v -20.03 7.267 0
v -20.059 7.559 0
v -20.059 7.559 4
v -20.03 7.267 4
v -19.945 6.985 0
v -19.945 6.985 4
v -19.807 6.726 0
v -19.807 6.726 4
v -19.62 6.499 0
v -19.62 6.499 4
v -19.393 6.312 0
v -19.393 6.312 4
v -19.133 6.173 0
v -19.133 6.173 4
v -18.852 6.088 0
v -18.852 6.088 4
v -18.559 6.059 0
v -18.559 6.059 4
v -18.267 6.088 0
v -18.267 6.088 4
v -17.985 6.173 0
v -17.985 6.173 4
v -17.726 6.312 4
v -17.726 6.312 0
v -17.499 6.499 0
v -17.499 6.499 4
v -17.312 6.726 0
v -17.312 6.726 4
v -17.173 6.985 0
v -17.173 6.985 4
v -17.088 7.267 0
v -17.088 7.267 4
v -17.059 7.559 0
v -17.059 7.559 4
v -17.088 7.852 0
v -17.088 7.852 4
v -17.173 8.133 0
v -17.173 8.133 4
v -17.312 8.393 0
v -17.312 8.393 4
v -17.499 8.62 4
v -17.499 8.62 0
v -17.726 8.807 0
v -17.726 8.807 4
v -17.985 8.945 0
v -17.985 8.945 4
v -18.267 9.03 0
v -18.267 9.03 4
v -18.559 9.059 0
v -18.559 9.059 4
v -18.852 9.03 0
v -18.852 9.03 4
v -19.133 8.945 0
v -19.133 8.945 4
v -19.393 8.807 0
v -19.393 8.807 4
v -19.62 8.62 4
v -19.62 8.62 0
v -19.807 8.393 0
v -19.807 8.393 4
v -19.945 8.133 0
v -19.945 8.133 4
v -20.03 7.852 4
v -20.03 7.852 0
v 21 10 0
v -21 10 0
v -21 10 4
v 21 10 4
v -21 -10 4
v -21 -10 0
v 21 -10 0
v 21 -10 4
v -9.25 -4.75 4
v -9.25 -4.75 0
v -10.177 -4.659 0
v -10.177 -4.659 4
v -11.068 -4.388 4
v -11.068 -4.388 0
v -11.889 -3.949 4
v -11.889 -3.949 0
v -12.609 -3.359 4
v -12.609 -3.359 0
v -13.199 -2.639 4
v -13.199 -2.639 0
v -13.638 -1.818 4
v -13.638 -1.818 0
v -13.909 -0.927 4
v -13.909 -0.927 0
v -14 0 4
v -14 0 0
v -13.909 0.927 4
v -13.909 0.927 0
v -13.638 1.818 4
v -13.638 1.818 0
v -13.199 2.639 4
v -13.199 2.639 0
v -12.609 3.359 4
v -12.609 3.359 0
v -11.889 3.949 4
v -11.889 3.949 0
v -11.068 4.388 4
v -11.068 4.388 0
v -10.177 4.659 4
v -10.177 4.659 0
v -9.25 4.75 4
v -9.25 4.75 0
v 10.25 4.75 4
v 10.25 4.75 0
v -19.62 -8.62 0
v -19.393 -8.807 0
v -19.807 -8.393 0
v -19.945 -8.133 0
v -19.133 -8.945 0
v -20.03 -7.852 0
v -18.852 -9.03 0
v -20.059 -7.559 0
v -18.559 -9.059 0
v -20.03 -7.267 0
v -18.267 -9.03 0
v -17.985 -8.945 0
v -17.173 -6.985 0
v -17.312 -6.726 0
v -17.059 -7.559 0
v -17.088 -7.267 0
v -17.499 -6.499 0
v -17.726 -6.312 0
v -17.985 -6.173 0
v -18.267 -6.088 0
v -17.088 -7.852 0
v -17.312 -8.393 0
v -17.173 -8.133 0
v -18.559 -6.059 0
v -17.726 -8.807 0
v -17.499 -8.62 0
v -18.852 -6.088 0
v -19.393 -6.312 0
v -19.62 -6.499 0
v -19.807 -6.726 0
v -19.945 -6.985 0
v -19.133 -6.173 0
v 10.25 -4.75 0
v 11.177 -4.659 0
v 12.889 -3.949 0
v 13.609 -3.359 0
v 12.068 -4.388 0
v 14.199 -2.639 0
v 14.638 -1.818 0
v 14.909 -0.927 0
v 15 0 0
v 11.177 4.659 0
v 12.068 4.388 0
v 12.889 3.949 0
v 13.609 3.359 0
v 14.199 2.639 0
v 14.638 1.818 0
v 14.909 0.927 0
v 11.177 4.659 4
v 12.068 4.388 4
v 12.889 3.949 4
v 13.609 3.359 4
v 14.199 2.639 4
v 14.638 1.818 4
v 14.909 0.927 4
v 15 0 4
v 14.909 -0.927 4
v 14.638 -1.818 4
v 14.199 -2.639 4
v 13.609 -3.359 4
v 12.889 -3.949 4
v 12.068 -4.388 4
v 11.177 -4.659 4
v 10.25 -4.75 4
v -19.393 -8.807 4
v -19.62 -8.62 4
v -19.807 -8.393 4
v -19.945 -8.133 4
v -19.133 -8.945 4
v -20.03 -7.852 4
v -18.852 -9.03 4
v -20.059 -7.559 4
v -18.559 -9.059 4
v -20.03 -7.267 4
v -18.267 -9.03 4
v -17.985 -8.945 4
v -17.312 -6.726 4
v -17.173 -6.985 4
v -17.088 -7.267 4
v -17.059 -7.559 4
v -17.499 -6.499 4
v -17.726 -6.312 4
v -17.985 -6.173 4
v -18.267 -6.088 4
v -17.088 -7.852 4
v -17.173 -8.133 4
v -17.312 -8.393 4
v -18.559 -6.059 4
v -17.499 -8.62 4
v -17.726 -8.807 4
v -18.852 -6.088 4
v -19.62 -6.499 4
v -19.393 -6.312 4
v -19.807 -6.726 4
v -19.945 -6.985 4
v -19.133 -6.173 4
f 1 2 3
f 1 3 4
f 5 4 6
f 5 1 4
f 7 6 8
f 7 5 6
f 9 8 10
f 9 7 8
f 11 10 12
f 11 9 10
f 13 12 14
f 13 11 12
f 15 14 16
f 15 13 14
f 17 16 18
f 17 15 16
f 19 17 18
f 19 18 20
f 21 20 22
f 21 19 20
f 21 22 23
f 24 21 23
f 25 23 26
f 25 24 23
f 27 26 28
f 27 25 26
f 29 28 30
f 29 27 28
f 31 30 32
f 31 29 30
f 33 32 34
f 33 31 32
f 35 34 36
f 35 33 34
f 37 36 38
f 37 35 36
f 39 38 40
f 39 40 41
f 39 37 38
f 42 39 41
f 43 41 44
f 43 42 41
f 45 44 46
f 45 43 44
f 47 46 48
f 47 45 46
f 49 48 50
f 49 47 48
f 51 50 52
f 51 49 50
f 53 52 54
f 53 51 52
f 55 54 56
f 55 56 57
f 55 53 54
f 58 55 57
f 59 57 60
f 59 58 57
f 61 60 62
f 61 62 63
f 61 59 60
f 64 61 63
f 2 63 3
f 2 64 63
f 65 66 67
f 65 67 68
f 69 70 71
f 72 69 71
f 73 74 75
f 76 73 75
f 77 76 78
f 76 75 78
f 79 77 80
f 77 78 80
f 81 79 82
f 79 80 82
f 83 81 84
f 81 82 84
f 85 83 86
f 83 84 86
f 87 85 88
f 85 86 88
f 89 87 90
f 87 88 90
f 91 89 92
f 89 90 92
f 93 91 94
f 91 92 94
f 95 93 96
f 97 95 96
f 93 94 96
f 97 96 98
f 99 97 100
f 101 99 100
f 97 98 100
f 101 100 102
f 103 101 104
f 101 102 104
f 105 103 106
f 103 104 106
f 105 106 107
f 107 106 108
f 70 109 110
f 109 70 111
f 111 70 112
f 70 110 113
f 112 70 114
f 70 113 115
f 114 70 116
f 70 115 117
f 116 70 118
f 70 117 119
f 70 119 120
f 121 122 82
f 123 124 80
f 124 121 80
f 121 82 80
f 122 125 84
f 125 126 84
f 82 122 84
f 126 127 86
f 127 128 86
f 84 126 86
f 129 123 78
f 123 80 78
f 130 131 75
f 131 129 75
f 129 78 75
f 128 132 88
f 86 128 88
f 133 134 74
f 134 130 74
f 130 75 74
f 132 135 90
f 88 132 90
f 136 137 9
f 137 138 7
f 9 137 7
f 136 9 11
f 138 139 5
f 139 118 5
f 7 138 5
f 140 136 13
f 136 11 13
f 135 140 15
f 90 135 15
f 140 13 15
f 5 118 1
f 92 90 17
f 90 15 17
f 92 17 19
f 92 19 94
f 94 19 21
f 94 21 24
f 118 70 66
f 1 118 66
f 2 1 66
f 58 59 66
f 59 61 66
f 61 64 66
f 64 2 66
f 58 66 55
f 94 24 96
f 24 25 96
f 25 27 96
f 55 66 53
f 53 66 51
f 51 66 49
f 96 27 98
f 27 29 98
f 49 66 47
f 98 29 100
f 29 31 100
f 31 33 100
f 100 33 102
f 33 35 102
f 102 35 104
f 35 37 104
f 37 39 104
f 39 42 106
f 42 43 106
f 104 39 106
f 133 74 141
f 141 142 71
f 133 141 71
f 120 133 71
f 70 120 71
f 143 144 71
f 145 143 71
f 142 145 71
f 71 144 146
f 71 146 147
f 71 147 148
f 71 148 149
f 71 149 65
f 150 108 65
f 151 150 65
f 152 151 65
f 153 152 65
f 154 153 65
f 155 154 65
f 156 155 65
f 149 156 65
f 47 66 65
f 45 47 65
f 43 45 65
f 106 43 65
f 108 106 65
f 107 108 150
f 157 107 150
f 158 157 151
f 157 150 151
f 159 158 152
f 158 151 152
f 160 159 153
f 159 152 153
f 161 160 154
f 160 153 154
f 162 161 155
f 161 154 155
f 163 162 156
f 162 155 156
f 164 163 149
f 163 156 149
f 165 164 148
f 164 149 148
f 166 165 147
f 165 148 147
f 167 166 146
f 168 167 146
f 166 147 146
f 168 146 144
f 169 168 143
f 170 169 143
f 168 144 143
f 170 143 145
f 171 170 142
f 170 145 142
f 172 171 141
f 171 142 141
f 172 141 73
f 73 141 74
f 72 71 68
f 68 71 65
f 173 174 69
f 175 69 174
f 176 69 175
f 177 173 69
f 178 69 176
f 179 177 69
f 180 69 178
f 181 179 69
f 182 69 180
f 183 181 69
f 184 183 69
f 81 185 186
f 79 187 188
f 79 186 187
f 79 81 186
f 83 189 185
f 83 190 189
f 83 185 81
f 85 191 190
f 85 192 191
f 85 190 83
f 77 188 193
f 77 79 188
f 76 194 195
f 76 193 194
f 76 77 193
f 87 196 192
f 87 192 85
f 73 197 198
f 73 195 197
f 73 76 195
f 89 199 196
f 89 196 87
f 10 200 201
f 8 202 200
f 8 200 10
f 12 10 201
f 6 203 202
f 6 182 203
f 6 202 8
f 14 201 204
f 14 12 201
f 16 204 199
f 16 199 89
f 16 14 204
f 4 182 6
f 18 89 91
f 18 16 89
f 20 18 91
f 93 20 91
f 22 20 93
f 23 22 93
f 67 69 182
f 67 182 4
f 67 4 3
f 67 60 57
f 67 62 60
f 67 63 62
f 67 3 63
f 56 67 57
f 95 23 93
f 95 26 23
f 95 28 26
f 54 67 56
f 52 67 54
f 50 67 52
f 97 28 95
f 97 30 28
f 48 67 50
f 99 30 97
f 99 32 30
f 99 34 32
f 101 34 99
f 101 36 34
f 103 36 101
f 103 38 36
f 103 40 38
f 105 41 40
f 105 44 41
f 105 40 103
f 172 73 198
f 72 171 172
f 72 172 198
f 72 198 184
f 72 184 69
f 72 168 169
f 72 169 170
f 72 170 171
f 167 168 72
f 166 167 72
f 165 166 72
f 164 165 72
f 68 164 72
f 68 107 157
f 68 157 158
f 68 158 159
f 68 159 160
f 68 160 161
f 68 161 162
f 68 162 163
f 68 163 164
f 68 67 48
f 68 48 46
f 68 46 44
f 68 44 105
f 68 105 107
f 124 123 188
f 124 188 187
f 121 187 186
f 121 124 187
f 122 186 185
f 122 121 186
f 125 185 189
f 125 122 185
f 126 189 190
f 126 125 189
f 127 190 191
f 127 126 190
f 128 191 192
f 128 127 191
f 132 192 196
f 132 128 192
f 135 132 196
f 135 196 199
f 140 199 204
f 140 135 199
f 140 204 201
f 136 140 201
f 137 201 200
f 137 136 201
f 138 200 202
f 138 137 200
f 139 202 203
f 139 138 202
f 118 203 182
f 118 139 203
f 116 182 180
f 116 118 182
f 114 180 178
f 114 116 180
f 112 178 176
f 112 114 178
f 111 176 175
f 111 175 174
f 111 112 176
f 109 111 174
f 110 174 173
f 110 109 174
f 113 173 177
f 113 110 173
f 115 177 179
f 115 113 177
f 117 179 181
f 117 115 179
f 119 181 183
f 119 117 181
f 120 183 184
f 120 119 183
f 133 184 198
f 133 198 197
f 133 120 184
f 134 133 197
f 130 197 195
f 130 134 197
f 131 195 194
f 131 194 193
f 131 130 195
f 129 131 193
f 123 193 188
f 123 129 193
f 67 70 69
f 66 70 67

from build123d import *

# Parameters (mm, degrees)
SKETCH1_W           = 42
SKETCH1_H           = 20
SKETCH1_R           = 1.5
BOSS_EXTRUDE1_DEPTH = 4


with BuildPart() as part:
    # Sketch1 → Boss-Extrude1 (new body)
    with BuildSketch(Plane.XY):
        Rectangle(SKETCH1_W, SKETCH1_H)
        with Locations((-18.559305938, -7.559305938)):
            Circle(SKETCH1_R, mode=Mode.SUBTRACT)
        with Locations(Location((-18.559305938, 7.559305938, 0), (0, 0, 180))):
            Circle(SKETCH1_R, mode=Mode.SUBTRACT)
        with BuildLine():
            Line((-9.25, 4.75), (10.25, 4.75))
            ThreePointArc((10.25, 4.75), (15, 0), (10.25, -4.75))
            Line((10.25, -4.75), (-9.25, -4.75))
            ThreePointArc((-9.25, -4.75), (-14, 0), (-9.25, 4.75))
        make_face(mode=Mode.SUBTRACT)
    extrude(amount=BOSS_EXTRUDE1_DEPTH)


solid = part.part
